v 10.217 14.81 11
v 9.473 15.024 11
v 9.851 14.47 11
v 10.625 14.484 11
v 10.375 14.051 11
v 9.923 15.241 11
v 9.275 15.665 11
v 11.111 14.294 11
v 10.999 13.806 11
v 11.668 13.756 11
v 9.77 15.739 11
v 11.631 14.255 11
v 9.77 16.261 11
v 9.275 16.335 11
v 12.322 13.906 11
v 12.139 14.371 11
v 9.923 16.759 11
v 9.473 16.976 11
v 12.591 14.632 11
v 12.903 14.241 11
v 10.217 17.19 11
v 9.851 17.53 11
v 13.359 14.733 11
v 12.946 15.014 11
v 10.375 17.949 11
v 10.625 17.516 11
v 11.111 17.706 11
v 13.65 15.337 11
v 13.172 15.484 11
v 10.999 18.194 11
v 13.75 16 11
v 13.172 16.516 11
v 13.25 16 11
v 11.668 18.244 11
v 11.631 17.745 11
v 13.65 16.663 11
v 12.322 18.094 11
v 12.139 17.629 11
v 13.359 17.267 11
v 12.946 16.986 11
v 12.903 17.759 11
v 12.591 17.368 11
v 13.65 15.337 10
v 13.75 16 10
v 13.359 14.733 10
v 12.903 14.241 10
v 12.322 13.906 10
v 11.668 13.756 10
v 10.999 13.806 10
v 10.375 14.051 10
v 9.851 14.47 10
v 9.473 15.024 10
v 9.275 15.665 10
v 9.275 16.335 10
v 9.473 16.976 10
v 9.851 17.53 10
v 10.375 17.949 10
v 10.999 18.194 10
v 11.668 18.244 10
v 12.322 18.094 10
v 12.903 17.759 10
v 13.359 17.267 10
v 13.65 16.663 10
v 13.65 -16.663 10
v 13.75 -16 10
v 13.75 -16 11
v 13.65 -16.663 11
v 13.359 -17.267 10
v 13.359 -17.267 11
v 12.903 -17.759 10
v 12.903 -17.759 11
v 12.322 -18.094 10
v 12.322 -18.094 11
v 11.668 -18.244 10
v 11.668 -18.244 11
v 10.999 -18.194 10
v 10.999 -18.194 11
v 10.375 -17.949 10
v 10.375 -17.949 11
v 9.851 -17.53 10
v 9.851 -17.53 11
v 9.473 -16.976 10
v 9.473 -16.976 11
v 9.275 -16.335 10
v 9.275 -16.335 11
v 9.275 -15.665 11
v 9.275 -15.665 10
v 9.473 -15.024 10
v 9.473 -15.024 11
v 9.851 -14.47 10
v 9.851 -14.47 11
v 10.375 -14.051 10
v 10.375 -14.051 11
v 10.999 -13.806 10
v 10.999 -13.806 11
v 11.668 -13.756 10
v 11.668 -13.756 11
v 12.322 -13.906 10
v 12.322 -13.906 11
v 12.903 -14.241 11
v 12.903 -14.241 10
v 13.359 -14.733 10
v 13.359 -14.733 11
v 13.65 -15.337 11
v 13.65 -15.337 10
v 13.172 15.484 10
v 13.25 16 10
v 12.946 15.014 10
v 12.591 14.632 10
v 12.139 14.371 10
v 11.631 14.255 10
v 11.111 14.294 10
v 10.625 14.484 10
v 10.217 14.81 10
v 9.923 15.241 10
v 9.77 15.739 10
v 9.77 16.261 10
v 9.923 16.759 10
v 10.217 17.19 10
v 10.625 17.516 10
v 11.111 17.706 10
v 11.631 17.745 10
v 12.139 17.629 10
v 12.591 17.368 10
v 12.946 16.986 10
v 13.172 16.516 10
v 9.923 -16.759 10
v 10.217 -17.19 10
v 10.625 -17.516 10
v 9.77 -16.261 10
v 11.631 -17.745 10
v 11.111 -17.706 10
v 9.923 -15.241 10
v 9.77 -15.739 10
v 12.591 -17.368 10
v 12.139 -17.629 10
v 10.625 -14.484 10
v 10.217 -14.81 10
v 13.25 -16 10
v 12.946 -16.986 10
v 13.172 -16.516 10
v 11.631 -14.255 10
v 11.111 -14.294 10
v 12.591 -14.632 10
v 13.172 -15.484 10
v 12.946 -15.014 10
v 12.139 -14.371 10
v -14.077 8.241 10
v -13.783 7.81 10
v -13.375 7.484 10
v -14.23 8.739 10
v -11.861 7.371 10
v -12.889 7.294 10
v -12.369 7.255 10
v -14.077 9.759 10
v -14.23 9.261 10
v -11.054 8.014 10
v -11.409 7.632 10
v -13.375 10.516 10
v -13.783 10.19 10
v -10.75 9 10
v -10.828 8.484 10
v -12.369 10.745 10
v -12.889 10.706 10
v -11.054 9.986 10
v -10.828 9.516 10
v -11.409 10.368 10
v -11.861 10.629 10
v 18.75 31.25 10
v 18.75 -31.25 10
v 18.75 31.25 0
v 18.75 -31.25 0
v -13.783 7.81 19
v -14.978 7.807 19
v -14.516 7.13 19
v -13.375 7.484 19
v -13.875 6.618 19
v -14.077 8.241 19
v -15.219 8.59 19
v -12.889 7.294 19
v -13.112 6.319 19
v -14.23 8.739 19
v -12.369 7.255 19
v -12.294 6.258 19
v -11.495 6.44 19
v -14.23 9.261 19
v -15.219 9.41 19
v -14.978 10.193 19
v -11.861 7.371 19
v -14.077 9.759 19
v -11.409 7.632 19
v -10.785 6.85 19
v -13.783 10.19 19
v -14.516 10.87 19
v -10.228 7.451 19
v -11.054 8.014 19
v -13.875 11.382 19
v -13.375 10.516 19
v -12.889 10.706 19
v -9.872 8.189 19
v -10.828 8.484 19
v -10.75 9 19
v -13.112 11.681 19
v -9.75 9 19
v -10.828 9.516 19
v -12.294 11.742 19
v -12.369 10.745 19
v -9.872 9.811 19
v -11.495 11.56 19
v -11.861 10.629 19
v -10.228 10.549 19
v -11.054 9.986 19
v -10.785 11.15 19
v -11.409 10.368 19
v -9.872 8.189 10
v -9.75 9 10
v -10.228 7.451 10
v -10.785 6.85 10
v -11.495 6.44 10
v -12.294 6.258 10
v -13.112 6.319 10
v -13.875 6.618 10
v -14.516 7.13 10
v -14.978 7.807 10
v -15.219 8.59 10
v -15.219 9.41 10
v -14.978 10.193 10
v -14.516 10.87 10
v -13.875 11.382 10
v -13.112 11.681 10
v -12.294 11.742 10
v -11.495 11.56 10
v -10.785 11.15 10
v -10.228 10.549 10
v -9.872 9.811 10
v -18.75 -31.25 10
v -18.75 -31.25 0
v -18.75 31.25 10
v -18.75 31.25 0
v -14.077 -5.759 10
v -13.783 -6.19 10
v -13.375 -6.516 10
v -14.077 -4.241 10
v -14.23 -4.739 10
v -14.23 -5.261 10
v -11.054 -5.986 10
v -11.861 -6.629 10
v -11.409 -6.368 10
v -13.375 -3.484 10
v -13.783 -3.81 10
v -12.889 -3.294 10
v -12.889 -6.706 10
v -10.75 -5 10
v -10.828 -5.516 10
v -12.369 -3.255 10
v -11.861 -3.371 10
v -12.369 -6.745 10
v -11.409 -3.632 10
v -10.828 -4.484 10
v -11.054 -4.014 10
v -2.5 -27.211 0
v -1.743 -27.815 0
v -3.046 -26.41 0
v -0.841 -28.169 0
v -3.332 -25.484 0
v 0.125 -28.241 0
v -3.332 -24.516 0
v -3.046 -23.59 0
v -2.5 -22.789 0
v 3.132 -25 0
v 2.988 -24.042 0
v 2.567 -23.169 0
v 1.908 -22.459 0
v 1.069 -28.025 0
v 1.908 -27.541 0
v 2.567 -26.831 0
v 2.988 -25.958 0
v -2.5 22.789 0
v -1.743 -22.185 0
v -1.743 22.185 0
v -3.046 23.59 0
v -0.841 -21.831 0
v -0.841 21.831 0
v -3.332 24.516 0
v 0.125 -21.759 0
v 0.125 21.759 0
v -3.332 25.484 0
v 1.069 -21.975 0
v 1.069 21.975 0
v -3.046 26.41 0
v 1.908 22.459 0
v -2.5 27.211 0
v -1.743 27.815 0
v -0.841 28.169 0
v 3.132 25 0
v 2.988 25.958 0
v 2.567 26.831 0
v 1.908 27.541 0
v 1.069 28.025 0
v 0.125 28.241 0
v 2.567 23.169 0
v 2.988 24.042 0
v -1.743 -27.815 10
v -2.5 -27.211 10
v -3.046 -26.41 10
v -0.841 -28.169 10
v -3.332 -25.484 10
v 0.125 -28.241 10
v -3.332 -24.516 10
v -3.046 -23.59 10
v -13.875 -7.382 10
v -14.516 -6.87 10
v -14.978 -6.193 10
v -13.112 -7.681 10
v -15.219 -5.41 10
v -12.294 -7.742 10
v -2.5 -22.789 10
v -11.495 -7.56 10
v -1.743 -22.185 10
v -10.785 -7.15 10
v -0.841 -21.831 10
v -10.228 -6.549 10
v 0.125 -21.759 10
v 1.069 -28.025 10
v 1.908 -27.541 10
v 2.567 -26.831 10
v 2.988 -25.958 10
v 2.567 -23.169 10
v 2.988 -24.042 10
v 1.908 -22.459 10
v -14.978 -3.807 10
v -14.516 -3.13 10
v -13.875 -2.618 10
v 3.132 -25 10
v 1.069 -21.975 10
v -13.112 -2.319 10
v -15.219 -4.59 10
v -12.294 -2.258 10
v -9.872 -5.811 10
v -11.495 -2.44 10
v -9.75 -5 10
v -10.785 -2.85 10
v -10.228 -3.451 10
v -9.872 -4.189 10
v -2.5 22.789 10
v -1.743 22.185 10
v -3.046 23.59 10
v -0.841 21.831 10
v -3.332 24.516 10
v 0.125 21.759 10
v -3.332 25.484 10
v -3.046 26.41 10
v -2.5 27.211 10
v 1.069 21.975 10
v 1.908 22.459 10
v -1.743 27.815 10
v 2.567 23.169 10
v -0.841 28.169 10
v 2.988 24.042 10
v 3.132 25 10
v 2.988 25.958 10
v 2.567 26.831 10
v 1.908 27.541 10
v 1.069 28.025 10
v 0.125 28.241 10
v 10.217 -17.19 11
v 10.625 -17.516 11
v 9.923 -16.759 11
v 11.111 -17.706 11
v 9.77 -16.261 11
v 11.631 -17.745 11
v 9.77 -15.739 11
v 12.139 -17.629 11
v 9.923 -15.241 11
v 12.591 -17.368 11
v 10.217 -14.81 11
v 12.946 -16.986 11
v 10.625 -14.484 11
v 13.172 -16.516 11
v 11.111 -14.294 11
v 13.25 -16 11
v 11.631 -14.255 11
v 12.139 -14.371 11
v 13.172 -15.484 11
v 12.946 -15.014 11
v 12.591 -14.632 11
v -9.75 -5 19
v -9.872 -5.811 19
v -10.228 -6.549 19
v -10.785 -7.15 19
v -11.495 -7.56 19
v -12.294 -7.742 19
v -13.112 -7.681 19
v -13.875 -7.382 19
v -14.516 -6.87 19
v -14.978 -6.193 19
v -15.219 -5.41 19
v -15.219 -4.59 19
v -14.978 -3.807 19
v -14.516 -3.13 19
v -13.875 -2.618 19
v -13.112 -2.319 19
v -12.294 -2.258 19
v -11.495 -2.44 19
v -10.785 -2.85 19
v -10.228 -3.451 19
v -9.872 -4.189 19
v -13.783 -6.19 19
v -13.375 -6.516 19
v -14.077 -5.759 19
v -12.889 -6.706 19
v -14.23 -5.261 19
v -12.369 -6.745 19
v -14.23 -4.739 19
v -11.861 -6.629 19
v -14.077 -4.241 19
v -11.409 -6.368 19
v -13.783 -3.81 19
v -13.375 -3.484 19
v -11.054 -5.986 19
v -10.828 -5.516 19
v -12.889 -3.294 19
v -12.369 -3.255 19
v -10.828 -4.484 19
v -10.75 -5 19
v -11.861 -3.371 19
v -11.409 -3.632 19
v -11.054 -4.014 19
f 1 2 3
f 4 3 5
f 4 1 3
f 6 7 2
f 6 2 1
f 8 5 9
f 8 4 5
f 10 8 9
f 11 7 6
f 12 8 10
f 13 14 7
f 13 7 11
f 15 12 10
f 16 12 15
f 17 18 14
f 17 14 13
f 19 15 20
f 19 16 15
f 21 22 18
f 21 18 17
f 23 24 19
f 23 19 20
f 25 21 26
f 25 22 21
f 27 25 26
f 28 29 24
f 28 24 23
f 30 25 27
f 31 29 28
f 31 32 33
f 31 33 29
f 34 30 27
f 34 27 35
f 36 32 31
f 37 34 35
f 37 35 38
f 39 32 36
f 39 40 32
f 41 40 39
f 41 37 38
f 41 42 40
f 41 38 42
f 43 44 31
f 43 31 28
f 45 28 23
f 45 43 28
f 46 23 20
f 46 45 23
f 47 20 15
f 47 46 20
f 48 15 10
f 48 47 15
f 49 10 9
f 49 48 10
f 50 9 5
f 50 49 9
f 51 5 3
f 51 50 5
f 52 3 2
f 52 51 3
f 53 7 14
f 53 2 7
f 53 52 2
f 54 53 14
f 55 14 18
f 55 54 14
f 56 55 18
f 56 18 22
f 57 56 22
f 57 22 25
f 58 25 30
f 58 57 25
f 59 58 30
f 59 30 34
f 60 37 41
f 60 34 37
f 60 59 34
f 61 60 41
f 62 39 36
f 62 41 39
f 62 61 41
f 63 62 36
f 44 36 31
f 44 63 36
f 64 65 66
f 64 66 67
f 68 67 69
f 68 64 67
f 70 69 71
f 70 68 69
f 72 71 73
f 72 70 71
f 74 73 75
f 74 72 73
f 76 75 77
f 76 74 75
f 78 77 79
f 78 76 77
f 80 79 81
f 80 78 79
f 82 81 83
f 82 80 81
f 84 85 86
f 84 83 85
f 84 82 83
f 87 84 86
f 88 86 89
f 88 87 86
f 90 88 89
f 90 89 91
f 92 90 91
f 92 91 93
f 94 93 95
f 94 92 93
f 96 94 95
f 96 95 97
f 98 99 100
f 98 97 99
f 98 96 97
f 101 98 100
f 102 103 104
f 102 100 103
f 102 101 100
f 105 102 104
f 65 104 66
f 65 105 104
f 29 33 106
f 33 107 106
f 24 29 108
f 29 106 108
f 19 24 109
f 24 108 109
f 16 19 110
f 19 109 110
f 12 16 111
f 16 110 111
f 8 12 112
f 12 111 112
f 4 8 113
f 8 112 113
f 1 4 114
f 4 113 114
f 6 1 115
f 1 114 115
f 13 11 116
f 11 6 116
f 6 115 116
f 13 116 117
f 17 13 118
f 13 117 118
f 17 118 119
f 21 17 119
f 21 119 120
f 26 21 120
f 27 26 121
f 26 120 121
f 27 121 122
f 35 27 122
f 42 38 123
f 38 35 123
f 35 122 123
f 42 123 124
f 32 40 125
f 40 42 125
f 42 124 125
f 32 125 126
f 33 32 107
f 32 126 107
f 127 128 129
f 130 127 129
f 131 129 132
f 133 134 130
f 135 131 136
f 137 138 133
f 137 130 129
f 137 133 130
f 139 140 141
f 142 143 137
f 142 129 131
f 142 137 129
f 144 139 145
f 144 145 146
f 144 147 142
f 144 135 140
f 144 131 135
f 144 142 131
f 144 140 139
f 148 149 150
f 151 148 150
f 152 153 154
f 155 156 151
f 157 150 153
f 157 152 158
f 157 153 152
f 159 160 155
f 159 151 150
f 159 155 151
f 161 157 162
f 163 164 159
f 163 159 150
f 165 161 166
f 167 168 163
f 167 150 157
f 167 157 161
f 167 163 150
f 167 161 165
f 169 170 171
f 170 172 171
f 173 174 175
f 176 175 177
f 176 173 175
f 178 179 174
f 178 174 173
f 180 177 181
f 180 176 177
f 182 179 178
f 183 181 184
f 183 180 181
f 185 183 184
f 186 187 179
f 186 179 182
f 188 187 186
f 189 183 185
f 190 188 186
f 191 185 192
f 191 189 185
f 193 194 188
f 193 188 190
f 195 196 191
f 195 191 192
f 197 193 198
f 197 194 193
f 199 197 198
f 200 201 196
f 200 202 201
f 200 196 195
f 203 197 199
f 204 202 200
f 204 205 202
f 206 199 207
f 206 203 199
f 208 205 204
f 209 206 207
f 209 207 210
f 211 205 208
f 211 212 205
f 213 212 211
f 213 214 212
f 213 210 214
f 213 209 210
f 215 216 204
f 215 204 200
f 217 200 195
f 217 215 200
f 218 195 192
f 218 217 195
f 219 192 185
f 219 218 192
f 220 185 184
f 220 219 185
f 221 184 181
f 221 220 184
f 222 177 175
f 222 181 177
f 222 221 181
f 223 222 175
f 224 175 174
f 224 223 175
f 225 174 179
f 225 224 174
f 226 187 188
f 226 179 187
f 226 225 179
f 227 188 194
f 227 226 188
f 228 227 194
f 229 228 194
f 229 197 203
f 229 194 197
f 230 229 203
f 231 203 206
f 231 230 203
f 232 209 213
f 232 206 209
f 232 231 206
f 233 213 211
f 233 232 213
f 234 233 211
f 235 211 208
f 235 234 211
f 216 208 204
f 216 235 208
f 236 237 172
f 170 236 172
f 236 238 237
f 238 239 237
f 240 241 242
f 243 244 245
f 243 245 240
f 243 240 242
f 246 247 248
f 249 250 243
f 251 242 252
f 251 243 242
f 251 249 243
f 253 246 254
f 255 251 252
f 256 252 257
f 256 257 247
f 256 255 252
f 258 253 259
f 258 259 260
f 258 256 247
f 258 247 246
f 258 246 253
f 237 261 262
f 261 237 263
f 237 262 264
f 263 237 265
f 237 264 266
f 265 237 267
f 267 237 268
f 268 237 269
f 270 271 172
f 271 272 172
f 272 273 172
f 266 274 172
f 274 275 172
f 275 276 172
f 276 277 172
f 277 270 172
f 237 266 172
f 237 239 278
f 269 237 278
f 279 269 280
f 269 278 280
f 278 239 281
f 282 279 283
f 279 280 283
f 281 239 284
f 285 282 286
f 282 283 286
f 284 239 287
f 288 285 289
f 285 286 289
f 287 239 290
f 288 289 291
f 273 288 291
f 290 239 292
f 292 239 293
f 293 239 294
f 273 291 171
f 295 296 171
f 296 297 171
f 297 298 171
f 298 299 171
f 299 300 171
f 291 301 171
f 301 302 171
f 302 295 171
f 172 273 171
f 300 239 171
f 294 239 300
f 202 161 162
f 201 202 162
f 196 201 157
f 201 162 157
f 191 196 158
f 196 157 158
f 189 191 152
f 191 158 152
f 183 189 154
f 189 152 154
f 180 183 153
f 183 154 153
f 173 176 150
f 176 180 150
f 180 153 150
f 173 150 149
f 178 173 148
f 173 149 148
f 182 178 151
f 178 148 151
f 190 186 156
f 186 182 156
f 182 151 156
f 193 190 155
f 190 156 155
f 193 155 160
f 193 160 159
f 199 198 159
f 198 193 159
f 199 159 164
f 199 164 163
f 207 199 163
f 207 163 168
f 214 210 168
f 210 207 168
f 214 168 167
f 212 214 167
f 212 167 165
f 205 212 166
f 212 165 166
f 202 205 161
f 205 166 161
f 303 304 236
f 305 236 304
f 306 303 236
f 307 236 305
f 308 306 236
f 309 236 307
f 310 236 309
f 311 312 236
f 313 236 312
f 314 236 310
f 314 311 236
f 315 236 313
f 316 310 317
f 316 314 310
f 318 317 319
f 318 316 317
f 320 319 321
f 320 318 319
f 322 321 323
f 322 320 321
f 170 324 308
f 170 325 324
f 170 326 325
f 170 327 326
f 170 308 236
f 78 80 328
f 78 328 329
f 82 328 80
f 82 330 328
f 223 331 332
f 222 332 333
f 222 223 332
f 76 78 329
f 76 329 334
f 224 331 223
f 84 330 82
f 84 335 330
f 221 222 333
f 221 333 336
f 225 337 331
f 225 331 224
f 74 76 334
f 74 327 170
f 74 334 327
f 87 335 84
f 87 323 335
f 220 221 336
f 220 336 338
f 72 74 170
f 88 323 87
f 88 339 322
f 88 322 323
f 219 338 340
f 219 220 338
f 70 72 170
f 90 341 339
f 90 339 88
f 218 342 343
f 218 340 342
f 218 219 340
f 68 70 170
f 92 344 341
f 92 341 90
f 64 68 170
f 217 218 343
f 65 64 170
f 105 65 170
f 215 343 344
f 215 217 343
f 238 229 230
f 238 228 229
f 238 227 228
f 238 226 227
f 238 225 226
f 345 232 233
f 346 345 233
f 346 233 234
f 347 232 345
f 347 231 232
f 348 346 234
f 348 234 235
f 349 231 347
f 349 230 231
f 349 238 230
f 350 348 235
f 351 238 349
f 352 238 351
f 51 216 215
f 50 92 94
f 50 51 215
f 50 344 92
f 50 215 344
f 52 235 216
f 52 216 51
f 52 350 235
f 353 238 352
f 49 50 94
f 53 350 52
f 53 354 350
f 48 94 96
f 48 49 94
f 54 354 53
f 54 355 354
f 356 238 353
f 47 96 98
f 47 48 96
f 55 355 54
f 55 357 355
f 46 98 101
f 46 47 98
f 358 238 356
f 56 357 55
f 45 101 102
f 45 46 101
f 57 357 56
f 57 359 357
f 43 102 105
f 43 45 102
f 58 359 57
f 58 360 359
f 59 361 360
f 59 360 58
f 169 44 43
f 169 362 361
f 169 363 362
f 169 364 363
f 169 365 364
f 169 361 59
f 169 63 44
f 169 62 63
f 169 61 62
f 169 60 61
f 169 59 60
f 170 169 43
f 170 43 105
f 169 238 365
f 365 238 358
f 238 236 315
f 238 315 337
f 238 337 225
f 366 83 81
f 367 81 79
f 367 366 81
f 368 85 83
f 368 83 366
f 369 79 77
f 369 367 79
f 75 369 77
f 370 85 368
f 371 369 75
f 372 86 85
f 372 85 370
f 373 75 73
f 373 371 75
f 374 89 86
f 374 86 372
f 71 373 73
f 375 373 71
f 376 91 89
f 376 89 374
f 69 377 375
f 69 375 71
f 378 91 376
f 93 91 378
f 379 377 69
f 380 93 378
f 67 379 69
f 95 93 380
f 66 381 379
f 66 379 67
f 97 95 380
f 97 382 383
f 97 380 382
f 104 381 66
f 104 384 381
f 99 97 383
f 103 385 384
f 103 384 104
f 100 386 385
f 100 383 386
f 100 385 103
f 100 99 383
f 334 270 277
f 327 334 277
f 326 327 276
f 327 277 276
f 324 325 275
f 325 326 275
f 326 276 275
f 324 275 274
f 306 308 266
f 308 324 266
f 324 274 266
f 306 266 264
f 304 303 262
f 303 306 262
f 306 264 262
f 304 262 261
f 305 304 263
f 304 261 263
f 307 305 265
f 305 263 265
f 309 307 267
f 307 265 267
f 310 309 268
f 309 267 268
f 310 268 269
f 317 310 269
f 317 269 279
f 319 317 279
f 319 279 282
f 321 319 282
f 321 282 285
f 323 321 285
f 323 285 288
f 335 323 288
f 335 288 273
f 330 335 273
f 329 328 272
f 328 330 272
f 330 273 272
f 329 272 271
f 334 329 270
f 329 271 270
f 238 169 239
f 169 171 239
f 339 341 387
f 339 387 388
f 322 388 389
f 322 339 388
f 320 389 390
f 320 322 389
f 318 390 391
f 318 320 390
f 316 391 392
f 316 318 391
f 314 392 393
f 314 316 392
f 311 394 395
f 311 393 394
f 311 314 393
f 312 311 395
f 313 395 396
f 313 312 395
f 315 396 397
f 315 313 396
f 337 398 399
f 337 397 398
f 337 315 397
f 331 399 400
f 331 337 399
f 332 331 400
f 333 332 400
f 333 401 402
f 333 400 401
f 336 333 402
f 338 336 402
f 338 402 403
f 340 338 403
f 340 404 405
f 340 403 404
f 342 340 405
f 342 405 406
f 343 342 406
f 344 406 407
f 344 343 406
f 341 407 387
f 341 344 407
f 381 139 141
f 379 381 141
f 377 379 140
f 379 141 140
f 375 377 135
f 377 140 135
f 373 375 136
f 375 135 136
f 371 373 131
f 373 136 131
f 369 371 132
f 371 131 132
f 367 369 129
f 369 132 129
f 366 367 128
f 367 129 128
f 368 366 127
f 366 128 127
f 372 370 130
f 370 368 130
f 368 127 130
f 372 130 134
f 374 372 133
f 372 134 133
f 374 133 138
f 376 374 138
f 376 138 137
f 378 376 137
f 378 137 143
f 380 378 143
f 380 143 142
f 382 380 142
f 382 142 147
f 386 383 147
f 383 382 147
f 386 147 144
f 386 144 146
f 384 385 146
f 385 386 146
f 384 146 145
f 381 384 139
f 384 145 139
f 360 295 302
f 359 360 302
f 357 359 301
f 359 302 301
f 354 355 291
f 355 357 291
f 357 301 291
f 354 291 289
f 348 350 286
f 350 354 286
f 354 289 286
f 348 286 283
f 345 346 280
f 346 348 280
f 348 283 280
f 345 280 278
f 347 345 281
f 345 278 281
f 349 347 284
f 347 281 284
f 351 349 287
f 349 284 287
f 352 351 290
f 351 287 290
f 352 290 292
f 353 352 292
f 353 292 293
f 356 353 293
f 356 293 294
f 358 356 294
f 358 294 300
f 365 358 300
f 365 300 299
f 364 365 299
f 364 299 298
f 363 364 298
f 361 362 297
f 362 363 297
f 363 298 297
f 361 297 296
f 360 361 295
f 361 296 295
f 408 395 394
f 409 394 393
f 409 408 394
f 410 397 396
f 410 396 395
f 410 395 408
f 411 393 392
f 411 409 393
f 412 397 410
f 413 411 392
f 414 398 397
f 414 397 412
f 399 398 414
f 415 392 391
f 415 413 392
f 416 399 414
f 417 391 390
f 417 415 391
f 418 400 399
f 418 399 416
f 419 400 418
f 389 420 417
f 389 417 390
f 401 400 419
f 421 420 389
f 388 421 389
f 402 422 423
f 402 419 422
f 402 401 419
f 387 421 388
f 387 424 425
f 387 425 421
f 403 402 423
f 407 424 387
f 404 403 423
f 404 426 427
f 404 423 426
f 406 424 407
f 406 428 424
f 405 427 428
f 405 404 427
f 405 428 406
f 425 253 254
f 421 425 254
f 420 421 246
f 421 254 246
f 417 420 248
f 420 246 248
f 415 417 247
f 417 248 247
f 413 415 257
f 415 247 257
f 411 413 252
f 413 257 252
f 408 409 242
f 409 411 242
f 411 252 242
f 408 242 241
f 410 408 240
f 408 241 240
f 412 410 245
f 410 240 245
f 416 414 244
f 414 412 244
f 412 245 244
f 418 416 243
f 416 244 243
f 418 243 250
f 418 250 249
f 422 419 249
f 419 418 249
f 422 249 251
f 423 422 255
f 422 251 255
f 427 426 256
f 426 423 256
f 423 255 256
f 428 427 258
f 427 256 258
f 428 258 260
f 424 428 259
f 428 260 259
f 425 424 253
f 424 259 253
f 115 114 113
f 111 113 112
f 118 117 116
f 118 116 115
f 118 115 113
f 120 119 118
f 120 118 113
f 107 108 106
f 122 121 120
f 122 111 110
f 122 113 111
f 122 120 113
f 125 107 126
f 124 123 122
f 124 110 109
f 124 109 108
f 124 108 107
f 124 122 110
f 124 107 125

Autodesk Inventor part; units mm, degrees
ref_plane "YZ Plane" through (0, 0, 0) normal (1, 0, 0) x (0, 1, 0)
ref_plane "XZ Plane" through (0, 0, 0) normal (0, 1, 0) x (-1, 0, 0)
ref_plane "XY Plane" through (0, 0, 0) normal (0, 0, 1) x (1, 0, 0)
sketch "Sketch2" plane through (0, 0, 0) normal (0, 0, 1) x (1, 0, 0)
  line L0 (18.75, -31.25) -> (18.75, 31.25)
  line L1 (18.75, 31.25) -> (-18.75, 31.25)
  line L2 (-18.75, 31.25) -> (-18.75, -31.25)
  line L3 (-18.75, -31.25) -> (18.75, -31.25)
  circle A0 centre (-0.1179, 25) radius 3.25 projected
  circle A1 centre (-0.1179, -25) radius 3.25 projected
  point P0 (0, 0)
extrude "Extrusion1" add sketch "Sketch2" along normal blind 10
sketch "Sketch4" plane through (0, 0, 10) normal (0, 0, 1) x (1, 0, 0)
  circle A0 centre (11.5, 16) radius 2.25
  circle A1 centre (-12.5, 9) radius 2.75
  circle A2 centre (-12.5, -5) radius 2.75
  circle A3 centre (11.5, -16) radius 2.25
  circle A4 centre (11.5, 16) radius 1.75
  circle A5 centre (11.5, -16) radius 1.75
  circle A6 centre (-12.5, -5) radius 1.75
  circle A7 centre (-12.5, 9) radius 1.75
  point P0 (0, 0)
  dimension "d6" = 3.5
  dimension "d7" = 3.5
  dimension "d8" = 3.5
  dimension "d9" = 3.5
  dimension "d10" = 4.5
  dimension "d11" = 4.5
  dimension "d12" = 5.5
  dimension "d13" = 5.5
extrude "Extrusion2" add sketch "Sketch4" along normal blind 1 contours A0 | A3
extrude "Extrusion3" add sketch "Sketch4" along normal blind 9 contours A1 | A2
thread "Thread1" size "M3.5x0.6" class "6H" standard "ANSI Metric M Profile" full length
thread "Thread2" size "M3.5x0.6" class "6H" standard "ANSI Metric M Profile" full length
thread "Thread3" size "M3.5x0.6" class "6H" standard "ANSI Metric M Profile" full length
thread "Thread4" size "M3.5x0.6" class "6H" standard "ANSI Metric M Profile" full length
properties part number "phm_top"
